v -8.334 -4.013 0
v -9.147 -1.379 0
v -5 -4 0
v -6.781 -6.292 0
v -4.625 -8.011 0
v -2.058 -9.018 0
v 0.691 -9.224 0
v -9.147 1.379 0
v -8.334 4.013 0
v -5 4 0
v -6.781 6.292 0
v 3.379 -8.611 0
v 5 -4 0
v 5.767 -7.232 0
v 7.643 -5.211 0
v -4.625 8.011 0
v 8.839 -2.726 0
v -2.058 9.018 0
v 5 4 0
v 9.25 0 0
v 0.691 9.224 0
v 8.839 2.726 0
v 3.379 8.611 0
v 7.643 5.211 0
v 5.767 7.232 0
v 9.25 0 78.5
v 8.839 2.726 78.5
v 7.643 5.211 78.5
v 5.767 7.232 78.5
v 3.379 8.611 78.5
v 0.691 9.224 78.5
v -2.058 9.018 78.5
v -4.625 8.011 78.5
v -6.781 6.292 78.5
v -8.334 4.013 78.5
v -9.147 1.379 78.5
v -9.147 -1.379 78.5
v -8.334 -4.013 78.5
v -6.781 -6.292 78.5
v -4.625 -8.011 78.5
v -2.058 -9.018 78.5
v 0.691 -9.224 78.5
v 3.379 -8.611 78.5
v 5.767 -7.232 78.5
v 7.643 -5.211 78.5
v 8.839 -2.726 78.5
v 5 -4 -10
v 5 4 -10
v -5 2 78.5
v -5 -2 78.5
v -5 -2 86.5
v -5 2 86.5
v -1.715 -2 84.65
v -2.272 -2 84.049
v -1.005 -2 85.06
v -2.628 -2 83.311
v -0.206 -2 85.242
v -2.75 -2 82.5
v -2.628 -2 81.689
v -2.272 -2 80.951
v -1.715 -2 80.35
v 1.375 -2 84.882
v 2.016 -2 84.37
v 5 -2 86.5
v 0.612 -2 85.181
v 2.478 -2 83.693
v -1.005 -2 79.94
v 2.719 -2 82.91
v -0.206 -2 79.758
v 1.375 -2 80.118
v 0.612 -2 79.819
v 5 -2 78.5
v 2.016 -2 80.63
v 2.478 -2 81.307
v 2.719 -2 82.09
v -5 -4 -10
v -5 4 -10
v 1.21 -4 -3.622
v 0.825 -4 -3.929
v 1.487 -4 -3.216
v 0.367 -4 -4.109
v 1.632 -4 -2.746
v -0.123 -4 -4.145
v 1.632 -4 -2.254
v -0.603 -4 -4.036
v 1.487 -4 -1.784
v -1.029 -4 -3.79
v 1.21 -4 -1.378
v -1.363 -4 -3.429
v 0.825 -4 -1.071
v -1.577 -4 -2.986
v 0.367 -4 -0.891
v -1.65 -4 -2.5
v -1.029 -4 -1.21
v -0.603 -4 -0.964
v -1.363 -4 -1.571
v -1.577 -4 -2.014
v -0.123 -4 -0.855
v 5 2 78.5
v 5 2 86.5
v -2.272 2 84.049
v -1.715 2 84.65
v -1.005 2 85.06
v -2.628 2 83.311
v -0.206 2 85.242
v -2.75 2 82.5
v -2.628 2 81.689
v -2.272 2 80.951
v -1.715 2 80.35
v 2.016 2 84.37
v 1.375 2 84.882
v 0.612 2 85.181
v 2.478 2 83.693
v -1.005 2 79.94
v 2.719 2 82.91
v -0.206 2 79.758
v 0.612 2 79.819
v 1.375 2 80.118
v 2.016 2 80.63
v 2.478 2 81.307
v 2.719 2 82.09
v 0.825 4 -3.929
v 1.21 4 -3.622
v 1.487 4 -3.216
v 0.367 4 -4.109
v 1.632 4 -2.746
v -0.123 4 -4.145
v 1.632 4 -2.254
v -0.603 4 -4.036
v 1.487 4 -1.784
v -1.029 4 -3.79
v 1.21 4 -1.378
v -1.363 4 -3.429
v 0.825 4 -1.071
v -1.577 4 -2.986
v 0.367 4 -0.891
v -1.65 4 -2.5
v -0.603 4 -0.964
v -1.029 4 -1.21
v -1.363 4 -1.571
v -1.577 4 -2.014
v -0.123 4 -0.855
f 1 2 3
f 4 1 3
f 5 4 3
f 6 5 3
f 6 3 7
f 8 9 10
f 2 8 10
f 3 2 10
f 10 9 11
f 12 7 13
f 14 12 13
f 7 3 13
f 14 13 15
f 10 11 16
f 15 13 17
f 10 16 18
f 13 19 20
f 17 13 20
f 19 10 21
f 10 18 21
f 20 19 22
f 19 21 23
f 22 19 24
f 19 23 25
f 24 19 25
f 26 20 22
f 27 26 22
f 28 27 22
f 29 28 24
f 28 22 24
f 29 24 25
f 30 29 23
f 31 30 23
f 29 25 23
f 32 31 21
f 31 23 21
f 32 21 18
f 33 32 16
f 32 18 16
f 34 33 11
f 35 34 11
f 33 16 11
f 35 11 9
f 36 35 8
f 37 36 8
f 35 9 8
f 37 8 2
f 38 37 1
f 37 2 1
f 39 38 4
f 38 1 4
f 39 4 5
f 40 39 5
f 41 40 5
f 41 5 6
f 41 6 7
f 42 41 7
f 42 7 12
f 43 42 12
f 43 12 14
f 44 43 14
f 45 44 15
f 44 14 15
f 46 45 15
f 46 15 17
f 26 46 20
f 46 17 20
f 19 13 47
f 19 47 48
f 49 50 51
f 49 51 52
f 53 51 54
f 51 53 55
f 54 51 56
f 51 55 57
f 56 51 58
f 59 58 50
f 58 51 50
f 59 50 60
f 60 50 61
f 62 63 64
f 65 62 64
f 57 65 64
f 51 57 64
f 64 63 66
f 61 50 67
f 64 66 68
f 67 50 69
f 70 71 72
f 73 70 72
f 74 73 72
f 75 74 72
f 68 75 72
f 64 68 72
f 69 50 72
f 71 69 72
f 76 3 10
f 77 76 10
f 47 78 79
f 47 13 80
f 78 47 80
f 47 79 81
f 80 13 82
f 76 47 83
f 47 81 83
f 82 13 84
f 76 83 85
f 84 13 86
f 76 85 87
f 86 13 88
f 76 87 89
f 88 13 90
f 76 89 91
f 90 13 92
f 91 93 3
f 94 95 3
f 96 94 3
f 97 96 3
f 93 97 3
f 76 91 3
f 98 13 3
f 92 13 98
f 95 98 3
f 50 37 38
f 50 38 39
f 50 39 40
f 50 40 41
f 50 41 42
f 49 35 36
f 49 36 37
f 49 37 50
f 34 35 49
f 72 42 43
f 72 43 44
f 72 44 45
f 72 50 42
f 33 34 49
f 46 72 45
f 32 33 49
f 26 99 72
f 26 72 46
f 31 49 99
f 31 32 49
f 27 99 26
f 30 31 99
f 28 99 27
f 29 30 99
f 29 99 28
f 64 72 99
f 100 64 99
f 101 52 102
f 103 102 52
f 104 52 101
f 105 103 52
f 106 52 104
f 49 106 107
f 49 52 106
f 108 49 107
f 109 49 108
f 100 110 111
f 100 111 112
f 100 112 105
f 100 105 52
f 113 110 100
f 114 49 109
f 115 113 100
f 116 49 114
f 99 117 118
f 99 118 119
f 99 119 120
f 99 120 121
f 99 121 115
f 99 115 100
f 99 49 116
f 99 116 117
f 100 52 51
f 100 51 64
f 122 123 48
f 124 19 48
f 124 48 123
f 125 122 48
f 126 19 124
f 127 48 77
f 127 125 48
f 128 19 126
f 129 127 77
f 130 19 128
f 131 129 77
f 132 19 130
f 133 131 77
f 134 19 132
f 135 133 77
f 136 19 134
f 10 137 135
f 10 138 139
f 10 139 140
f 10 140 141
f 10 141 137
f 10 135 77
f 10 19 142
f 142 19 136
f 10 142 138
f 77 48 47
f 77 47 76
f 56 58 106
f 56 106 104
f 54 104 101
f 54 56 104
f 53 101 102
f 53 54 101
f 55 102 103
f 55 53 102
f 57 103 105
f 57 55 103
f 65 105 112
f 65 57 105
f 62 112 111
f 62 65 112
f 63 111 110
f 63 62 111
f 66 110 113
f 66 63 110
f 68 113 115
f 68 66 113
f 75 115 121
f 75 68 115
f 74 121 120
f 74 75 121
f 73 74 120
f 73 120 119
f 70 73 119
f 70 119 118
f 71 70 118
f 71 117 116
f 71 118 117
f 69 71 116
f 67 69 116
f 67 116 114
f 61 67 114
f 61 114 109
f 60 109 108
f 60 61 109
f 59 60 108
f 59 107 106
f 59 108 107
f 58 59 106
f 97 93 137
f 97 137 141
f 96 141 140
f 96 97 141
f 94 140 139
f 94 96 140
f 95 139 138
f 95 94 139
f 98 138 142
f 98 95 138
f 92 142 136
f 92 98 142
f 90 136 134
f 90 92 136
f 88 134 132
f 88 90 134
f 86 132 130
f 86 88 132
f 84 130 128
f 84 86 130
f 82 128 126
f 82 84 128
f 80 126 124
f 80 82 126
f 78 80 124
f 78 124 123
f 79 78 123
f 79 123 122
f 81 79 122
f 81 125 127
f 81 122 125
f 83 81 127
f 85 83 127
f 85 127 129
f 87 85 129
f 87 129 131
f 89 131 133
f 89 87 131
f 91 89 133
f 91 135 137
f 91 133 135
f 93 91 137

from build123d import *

# Parameters (mm, degrees)
SKETCH_1_R               = 9.25
EXTRUDE_1_DEPTH          = 78.5
SKETCH_2_W               = 10
SKETCH_2_H               = 8
EXTRUDE_2_DEPTH          = 10
SKETCH_3_W               = 10
SKETCH_3_H               = 4
EXTRUDE_3_DEPTH          = 8
CUT_EXTRUDE_1_DEPTH      = 88.996448792
CUT_EXTRUDE_1_DEPTH_BACK = 88.996448792
SKETCH_5_R               = 1.65
SKETCH_5_R_2             = 2.75


with BuildPart() as part:
    # 草图1 → 凸台-拉伸1 (new body)
    with BuildSketch(Plane.XY):
        Circle(SKETCH_1_R)
    extrude(amount=EXTRUDE_1_DEPTH)

    # 草图2 → 凸台-拉伸2 (add)
    with BuildSketch(Plane(origin=(0, 0, 0), x_dir=(-1, 0, 0), z_dir=(0, 0, -1))):
        Rectangle(SKETCH_2_W, SKETCH_2_H)
    extrude(amount=EXTRUDE_2_DEPTH)

    # 草图3 → 凸台-拉伸3 (add)
    with BuildSketch(Plane.XY.offset(78.5)):
        Rectangle(SKETCH_3_W, SKETCH_3_H)
    extrude(amount=EXTRUDE_3_DEPTH)

    # 草图5 → 切除-拉伸1 (cut, two sides: drawn at the far end of the back side and taken through both)
    with BuildSketch(Plane(origin=(0, 4, 0), x_dir=(1, 0, 0), z_dir=(0, 1, 0)).offset(-CUT_EXTRUDE_1_DEPTH_BACK)):
        with Locations(Location((0, 2.5, 0), (0, 0, 180))):
            Circle(SKETCH_5_R)
        with Locations(Location((0, -82.5, 0), (0, 0, 180))):
            Circle(SKETCH_5_R_2)
    extrude(amount=CUT_EXTRUDE_1_DEPTH + CUT_EXTRUDE_1_DEPTH_BACK, mode=Mode.SUBTRACT)


solid = part.part
